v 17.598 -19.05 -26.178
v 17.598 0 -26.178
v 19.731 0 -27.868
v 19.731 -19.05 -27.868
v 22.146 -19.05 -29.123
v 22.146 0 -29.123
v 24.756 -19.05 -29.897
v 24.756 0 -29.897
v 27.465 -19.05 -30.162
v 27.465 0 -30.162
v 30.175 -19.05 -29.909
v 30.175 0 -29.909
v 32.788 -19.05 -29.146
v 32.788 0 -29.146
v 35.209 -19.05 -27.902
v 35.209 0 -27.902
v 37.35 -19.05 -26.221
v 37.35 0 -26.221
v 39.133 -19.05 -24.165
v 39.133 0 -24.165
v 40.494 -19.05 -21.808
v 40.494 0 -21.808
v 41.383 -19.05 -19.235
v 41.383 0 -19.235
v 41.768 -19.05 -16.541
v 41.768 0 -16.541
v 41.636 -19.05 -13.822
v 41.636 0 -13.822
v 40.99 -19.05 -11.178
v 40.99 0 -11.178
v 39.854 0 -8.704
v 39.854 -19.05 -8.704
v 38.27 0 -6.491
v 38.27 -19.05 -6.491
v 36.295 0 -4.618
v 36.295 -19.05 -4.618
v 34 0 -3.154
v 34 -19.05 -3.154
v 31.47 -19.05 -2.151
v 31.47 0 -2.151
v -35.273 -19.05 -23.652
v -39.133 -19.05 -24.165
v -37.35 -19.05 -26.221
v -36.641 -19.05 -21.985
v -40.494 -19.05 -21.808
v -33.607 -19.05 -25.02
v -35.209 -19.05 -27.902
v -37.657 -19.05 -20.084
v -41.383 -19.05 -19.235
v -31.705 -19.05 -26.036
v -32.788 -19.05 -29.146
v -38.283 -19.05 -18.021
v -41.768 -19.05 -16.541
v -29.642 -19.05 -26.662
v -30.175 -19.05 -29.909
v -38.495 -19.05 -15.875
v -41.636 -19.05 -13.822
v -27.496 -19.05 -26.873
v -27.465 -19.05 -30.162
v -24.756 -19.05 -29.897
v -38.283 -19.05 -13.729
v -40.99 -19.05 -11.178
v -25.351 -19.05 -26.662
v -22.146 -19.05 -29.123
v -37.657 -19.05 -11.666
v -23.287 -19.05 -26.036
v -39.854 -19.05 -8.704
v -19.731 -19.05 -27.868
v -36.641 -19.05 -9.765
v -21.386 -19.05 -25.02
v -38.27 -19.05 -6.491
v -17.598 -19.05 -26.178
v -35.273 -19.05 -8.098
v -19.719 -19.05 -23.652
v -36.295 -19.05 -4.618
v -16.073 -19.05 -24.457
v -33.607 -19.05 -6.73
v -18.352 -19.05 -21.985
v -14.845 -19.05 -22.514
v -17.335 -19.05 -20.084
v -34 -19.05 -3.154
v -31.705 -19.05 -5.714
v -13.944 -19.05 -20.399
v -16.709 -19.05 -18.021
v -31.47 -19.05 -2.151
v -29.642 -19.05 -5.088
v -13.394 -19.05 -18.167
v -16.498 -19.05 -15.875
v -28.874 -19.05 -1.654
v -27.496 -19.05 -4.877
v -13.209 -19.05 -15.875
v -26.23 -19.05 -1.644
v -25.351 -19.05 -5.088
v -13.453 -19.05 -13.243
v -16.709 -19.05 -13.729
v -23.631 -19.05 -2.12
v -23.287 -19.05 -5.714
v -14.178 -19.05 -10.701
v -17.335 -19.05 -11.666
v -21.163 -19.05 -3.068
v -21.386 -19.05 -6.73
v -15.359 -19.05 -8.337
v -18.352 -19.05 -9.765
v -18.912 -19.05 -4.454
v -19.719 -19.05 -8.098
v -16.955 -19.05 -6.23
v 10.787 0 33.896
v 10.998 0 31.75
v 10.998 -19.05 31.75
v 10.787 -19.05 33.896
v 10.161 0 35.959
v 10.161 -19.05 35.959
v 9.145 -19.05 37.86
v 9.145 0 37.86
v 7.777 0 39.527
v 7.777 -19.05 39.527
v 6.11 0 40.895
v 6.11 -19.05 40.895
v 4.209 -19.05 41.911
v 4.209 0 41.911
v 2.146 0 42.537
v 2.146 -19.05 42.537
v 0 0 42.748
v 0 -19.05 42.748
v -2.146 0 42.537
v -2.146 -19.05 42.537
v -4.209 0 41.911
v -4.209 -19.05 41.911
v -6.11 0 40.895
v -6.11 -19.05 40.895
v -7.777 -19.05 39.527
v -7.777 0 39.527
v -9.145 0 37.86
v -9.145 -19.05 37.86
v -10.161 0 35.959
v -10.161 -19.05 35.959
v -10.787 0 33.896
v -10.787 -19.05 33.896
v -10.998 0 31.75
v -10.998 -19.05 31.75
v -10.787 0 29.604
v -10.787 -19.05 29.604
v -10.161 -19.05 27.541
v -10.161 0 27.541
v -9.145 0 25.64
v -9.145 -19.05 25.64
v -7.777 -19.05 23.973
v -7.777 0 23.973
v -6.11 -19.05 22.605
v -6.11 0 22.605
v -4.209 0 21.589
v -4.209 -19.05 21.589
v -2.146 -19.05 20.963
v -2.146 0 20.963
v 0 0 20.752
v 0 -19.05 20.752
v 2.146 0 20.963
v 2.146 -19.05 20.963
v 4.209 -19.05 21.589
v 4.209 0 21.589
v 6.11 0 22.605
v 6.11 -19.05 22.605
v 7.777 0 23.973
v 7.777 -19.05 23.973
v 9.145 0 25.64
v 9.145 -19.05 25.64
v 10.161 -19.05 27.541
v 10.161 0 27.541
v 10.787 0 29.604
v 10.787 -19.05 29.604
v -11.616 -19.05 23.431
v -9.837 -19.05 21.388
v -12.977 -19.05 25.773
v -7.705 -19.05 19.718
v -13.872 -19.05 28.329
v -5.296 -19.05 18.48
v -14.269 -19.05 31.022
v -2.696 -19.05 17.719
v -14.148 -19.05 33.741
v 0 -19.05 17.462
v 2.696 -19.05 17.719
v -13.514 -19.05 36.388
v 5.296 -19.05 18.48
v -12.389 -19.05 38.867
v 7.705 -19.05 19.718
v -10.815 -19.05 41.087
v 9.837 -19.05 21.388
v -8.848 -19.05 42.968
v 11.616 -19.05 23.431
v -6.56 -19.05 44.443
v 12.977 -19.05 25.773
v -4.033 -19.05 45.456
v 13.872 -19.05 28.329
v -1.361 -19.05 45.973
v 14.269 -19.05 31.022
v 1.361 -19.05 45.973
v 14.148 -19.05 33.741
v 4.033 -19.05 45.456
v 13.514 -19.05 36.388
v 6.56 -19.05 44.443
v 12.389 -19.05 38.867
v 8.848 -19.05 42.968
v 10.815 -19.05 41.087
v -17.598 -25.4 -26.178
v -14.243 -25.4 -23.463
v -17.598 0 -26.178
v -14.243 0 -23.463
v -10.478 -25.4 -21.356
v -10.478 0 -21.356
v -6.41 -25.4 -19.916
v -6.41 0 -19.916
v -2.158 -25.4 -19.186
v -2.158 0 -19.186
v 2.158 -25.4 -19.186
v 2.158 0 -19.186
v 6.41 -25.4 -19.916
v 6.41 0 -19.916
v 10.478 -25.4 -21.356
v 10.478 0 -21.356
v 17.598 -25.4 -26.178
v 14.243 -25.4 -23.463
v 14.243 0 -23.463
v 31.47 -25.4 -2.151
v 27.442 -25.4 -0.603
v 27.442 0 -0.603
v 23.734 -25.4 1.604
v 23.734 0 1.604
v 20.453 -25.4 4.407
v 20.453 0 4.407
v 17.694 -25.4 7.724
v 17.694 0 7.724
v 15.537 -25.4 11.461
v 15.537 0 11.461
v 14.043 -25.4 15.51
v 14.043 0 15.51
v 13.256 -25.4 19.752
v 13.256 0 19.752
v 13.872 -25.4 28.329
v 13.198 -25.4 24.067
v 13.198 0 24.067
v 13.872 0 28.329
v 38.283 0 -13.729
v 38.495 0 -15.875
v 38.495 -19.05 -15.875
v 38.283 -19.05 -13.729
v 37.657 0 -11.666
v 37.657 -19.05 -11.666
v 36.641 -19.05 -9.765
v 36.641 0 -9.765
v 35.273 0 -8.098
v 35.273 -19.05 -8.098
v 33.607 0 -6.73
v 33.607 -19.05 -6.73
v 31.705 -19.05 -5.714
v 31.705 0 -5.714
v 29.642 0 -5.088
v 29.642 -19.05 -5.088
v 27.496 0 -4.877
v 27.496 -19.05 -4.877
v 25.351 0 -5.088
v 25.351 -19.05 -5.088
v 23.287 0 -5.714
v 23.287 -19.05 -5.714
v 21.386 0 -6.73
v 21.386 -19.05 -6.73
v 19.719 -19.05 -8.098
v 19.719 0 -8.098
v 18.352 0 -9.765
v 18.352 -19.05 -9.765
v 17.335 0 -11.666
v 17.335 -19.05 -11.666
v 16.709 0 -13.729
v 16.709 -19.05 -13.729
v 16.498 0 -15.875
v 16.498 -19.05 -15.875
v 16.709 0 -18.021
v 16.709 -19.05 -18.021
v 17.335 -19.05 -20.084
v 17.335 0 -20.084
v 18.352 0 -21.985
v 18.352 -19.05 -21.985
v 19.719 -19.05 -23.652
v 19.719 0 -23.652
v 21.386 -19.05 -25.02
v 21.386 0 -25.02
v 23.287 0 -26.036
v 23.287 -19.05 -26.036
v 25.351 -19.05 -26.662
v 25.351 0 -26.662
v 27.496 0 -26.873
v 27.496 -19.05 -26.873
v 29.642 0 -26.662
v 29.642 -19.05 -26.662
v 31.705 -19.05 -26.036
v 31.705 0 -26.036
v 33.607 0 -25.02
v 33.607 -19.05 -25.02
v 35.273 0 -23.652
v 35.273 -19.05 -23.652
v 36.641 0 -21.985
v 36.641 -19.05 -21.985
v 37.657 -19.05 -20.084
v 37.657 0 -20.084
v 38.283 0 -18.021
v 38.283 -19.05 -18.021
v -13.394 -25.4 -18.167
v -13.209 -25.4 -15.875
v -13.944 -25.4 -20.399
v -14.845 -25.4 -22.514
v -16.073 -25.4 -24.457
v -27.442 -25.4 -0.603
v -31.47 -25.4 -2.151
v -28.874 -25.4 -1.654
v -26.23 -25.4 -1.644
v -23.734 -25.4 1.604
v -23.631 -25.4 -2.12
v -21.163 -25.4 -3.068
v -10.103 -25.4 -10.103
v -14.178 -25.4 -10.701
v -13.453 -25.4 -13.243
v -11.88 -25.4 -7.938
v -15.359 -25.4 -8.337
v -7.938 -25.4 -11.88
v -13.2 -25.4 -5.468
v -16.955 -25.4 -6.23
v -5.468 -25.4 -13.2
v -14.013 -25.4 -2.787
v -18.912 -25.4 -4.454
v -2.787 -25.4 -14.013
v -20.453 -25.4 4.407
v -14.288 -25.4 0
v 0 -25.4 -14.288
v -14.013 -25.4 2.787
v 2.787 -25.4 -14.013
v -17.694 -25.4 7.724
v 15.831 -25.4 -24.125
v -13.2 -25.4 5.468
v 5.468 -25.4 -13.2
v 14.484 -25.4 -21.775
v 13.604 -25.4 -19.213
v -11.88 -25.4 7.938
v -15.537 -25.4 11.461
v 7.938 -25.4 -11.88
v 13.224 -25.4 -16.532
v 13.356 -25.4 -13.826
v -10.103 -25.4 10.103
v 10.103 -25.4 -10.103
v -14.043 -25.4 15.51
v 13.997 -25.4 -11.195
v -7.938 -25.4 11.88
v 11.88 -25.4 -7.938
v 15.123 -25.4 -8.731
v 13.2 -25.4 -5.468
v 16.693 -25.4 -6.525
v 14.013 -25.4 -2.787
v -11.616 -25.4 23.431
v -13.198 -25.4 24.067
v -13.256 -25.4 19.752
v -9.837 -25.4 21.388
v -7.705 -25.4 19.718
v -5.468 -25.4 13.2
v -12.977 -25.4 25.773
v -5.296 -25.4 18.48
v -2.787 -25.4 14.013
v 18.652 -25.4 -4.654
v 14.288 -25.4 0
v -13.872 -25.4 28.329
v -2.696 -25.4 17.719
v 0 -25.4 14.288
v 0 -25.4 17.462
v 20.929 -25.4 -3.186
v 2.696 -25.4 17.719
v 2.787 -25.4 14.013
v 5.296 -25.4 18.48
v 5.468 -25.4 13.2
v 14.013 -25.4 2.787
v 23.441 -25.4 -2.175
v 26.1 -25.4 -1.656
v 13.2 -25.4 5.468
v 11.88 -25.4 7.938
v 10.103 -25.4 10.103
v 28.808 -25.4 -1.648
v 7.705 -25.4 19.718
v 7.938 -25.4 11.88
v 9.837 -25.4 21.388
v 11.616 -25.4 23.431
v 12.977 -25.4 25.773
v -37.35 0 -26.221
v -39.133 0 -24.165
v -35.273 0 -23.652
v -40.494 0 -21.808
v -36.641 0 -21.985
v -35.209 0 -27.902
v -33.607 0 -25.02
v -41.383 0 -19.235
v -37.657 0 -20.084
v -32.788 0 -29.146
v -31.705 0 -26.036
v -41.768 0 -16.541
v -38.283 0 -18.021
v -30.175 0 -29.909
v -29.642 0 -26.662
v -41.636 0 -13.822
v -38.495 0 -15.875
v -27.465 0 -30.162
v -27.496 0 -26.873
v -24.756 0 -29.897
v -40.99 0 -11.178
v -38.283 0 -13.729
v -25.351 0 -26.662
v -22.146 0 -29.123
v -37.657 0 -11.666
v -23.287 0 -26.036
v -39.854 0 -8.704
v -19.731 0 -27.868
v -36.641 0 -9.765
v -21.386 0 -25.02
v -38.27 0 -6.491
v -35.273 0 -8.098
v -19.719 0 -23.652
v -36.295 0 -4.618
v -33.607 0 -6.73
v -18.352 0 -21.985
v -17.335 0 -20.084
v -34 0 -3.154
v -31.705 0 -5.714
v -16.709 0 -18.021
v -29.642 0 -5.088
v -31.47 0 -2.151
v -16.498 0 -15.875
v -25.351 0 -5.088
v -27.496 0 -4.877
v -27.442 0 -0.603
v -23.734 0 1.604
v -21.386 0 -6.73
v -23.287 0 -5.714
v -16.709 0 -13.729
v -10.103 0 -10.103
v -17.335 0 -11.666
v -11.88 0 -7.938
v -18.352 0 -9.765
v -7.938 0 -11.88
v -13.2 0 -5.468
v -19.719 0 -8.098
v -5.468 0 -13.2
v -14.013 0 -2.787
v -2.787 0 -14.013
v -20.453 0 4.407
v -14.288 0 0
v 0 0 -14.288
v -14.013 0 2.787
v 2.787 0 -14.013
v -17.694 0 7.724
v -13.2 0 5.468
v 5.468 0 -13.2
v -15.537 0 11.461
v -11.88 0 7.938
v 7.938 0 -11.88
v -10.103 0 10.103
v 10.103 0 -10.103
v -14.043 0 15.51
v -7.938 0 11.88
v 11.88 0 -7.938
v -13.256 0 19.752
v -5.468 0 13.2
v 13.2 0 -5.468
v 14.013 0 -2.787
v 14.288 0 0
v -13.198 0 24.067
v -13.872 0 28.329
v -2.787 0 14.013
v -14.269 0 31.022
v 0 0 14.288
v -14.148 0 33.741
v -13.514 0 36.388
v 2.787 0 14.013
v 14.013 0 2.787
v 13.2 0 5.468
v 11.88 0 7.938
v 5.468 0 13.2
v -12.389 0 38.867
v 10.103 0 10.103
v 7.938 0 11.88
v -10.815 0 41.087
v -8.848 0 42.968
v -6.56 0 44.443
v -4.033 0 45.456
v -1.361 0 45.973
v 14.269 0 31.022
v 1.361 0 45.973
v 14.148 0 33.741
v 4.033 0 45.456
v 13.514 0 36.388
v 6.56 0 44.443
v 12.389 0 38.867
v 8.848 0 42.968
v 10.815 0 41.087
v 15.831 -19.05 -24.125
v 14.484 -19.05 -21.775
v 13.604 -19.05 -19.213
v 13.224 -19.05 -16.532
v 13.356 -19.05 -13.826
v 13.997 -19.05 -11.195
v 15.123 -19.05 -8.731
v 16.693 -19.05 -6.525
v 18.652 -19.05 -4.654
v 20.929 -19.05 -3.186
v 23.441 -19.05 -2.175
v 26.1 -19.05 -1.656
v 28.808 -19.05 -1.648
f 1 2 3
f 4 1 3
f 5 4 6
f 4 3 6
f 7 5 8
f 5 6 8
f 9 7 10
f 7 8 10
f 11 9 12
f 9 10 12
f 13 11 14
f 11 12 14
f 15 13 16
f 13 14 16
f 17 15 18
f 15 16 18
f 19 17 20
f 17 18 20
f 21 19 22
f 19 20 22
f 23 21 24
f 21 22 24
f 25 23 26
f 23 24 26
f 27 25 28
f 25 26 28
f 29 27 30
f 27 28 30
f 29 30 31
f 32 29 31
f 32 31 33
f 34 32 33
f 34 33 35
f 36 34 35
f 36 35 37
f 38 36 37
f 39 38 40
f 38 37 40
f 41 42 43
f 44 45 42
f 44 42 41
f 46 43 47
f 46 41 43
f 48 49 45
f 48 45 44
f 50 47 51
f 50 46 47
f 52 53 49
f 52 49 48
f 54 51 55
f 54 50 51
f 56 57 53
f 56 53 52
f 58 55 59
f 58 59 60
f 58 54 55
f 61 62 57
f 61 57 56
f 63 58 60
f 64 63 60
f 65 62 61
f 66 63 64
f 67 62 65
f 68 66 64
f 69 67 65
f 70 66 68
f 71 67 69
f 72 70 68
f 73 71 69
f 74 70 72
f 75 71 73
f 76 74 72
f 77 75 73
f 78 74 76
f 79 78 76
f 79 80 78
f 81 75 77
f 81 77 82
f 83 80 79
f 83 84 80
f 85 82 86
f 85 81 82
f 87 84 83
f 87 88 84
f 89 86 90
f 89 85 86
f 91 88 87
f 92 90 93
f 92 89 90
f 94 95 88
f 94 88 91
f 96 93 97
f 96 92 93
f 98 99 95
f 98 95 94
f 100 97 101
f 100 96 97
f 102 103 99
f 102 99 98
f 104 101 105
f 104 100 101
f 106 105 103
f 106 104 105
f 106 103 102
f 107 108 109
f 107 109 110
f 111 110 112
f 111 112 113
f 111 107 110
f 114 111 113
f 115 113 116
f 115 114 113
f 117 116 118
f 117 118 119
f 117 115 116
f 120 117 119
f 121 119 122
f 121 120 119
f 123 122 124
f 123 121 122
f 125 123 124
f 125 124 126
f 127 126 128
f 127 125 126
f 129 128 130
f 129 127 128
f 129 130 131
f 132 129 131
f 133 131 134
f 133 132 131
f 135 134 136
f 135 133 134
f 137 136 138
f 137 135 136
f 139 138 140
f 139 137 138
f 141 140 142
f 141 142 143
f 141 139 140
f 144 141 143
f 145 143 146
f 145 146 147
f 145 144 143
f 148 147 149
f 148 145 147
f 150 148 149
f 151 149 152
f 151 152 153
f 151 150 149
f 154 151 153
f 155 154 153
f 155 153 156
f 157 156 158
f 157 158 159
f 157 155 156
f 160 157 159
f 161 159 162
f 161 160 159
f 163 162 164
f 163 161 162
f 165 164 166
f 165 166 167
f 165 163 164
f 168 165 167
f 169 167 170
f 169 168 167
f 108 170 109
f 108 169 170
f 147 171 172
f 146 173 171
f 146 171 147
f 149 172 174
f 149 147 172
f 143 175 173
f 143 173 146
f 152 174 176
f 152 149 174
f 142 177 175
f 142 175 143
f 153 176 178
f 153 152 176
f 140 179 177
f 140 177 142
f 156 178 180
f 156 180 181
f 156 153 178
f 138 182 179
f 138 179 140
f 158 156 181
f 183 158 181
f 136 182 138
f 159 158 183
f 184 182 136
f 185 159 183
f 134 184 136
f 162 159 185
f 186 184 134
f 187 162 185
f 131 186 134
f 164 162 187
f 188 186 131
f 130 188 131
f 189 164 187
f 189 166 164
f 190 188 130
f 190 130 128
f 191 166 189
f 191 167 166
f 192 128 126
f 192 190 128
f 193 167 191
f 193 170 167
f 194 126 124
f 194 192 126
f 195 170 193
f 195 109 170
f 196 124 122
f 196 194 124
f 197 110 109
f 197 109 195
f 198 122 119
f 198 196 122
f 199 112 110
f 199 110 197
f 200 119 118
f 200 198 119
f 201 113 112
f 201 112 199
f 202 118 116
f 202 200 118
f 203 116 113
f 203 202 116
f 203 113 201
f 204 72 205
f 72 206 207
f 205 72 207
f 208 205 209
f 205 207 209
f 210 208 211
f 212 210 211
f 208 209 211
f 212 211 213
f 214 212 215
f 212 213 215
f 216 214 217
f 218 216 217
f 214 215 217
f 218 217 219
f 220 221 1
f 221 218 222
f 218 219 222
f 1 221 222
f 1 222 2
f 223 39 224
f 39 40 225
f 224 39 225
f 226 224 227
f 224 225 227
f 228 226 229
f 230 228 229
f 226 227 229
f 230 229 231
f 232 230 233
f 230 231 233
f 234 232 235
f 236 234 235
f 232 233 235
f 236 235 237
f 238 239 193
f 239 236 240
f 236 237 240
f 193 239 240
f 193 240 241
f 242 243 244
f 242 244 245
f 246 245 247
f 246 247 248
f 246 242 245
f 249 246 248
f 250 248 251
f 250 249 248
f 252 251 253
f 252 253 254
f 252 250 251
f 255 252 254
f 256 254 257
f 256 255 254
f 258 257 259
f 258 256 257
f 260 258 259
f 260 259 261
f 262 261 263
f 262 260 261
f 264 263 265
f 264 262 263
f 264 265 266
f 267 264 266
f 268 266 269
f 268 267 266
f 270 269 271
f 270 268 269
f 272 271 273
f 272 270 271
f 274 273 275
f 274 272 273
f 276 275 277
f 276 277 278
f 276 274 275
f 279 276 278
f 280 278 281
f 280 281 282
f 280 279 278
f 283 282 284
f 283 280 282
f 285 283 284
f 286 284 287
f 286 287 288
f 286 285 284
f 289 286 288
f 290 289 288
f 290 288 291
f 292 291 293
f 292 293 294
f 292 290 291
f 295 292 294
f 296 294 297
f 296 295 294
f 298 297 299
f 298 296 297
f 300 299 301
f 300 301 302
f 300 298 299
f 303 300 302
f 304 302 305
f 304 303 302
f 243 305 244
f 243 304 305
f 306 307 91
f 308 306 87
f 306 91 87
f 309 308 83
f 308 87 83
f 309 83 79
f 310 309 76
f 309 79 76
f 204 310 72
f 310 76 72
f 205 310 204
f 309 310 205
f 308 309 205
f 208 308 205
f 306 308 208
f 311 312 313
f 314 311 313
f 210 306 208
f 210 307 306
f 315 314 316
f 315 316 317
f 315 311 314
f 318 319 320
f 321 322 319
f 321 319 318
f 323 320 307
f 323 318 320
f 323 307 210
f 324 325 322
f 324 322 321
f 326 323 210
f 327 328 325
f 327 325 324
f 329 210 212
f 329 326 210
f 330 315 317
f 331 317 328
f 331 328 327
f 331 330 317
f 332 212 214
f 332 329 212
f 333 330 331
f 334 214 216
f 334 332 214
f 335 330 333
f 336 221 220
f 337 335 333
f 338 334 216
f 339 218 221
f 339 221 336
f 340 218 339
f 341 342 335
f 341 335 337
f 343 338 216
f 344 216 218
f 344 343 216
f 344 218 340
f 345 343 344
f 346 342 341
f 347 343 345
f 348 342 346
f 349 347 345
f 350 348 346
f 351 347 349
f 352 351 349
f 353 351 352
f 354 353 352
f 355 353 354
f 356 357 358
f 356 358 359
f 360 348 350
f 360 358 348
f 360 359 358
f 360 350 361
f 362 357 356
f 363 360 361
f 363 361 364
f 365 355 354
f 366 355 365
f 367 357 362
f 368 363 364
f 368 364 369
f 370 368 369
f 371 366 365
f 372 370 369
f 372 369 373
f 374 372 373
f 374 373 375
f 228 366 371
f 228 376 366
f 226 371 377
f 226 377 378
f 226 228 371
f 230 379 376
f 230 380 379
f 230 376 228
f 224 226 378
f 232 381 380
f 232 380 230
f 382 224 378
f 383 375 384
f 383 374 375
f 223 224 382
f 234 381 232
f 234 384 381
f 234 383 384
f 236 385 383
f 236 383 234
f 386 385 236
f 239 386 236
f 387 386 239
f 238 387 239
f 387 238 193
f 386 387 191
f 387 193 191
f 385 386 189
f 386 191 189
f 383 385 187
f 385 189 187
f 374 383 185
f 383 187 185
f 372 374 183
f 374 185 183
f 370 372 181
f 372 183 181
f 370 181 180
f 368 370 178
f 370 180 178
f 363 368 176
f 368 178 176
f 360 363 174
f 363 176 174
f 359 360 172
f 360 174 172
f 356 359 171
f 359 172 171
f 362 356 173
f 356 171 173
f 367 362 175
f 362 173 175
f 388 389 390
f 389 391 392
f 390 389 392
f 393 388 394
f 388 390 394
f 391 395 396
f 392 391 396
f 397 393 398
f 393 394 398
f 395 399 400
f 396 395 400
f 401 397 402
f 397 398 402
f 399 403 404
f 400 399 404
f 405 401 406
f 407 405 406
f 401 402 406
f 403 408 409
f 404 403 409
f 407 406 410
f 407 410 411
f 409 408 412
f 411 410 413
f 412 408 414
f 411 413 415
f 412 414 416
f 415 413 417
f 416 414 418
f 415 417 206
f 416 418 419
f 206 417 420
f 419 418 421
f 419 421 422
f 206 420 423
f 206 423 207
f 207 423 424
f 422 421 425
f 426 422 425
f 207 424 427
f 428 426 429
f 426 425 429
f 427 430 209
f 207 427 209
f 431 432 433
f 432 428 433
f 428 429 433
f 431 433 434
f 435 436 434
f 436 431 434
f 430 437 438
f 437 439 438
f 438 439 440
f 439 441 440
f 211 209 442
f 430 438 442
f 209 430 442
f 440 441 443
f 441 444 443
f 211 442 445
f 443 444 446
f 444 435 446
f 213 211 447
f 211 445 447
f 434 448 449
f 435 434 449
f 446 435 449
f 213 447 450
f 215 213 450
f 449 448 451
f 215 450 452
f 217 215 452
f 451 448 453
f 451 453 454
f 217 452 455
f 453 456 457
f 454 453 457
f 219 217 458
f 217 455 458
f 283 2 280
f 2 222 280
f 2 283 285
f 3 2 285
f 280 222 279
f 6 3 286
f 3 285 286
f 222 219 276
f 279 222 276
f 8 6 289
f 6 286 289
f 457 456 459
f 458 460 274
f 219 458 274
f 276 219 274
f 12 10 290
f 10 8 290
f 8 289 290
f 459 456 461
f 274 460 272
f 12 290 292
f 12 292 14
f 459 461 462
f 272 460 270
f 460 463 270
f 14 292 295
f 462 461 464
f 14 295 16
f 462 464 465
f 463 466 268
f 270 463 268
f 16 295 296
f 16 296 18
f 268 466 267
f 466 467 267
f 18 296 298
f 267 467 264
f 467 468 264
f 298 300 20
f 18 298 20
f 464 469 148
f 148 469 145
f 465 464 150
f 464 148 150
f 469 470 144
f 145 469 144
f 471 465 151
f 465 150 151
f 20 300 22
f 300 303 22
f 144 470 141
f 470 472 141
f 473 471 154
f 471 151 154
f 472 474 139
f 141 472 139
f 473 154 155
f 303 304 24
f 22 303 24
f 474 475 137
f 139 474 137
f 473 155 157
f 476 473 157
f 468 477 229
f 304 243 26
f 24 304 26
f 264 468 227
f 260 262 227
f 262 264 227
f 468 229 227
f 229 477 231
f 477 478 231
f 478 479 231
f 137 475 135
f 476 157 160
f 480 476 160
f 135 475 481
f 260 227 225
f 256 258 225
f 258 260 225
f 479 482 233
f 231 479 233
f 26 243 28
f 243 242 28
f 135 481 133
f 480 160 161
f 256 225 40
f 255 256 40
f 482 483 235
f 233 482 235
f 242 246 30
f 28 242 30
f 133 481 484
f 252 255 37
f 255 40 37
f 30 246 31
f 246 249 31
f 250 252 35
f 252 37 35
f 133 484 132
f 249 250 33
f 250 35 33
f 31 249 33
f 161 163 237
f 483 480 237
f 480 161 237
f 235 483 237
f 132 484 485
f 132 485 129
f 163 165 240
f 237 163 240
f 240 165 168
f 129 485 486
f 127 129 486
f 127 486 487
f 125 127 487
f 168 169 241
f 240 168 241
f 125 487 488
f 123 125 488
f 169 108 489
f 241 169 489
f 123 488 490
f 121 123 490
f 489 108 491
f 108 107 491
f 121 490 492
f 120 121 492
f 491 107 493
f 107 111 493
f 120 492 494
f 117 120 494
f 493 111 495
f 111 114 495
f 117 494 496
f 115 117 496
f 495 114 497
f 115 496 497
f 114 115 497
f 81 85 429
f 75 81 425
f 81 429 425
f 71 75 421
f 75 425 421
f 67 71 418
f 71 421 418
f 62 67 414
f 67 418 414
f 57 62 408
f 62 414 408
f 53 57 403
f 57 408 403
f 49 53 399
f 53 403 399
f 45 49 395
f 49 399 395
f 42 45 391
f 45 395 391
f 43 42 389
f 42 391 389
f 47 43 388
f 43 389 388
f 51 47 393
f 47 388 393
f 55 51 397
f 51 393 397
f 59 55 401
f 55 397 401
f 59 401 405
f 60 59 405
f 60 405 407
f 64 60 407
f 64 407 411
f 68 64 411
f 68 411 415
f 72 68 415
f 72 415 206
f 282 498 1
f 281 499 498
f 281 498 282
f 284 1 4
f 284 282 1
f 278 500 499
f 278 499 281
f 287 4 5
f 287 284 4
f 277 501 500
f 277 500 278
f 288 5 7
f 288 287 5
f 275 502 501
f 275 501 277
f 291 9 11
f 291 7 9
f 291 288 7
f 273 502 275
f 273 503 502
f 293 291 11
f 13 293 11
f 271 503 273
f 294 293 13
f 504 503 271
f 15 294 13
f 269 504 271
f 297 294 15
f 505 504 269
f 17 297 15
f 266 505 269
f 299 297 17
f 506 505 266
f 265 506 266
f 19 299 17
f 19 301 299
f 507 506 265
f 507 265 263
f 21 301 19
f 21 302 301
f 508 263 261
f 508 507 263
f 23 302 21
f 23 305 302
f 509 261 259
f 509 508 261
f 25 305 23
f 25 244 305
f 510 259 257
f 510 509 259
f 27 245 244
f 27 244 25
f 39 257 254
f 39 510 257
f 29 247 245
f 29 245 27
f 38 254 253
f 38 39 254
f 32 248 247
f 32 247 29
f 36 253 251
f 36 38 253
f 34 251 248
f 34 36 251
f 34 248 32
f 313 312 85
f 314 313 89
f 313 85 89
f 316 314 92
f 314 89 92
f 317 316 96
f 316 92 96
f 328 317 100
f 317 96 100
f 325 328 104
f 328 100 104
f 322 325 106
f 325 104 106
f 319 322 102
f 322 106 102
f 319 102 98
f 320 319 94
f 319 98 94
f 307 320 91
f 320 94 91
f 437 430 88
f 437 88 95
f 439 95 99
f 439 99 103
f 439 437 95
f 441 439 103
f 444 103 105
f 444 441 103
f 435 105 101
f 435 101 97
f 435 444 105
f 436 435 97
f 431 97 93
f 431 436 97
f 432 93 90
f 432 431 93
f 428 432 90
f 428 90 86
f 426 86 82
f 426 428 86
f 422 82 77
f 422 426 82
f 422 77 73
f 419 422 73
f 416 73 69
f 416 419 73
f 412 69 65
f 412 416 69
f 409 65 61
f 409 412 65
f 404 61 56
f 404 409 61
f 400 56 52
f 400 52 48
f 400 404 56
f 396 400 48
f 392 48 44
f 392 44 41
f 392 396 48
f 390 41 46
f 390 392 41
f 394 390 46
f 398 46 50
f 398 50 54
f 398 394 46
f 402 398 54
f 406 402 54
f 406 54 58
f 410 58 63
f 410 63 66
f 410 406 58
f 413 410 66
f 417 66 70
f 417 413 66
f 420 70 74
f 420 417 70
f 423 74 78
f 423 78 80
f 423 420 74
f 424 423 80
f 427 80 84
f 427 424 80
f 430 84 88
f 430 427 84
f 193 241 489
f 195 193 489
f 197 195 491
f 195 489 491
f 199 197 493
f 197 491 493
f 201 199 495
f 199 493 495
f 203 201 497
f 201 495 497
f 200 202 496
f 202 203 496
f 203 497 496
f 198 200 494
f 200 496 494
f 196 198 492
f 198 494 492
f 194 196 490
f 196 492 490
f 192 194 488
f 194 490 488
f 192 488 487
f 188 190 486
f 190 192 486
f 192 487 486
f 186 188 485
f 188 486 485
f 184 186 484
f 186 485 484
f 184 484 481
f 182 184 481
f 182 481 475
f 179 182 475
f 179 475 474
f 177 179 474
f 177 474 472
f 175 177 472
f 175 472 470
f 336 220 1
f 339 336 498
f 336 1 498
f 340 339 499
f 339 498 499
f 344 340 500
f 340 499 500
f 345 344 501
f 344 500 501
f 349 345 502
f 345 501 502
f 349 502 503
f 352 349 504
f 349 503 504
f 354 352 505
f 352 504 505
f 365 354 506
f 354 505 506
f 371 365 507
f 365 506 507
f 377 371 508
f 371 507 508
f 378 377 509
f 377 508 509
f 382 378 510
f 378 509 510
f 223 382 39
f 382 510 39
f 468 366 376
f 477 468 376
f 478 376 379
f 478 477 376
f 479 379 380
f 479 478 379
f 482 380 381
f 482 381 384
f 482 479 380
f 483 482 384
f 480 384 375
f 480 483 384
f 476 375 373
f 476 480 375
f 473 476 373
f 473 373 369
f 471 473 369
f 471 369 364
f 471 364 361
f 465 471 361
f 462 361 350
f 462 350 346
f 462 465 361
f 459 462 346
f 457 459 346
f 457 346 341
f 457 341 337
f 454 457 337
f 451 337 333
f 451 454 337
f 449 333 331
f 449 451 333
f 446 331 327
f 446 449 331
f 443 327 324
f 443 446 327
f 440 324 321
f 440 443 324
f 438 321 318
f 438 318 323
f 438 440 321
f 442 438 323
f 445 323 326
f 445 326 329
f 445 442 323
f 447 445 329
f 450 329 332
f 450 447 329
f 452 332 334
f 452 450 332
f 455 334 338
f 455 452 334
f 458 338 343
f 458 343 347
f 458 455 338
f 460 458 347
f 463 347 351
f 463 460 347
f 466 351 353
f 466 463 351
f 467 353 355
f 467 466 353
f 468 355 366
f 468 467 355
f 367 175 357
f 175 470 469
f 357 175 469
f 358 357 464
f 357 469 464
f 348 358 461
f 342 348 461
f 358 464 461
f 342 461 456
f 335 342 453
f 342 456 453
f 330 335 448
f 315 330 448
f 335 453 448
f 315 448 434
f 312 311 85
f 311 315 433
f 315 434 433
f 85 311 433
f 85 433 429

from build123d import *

# Parameters (mm, degrees)
F1_R     = 14.2875
F2_DEPTH = 25.4
F0_R     = 14.2875
F0_R_2   = 10.9982
F3_DEPTH = 19.05


with BuildPart() as f2:
    # F1 (on Front) → F2 (new body)
    with BuildSketch(Plane.XZ):
        with BuildLine():
            ThreePointArc((13.8718760728, 28.3289313848), (0, 17.4625), (-13.8718760728, 28.3289313848))
            ThreePointArc((-13.8718760728, 28.3289313848), (-16.5359438351, 9.5470316245), (-31.4695122777, -2.1510686152))
            ThreePointArc((-31.4695122777, -2.1510686152), (-18.912441482, -4.4535326513), (-13.2088065702, -15.875))
            ThreePointArc((-13.2088065702, -15.875), (-14.3517276668, -21.4743483284), (-17.5976362049, -26.1778627696))
            ThreePointArc((-17.5976362049, -26.1778627696), (0, -19.094063249), (17.5976362049, -26.1778627696))
            ThreePointArc((17.5976362049, -26.1778627696), (15.1229686136, -8.73125), (31.4695122777, -2.1510686152))
            ThreePointArc((31.4695122777, -2.1510686152), (16.5359438351, 9.5470316245), (13.8718760728, 28.3289313848))
        make_face()
        Circle(F1_R, mode=Mode.SUBTRACT)
    extrude(amount=F2_DEPTH)

    # F0 (on Front) → F3 (join)
    with BuildSketch(Plane.XZ):
        with Locations((0, 31.75)):
            Circle(F0_R)
        with Locations((0, 31.75)):
            Circle(F0_R_2, mode=Mode.SUBTRACT)
        with Locations((27.4963065702, -15.875)):
            Circle(F0_R)
        with Locations((27.4963065702, -15.875)):
            Circle(F0_R_2, mode=Mode.SUBTRACT)
        with Locations((-27.4963065702, -15.875)):
            Circle(F0_R)
        with Locations((-27.4963065702, -15.875)):
            Circle(F0_R_2, mode=Mode.SUBTRACT)
    extrude(amount=F3_DEPTH)


solid = f2.part
